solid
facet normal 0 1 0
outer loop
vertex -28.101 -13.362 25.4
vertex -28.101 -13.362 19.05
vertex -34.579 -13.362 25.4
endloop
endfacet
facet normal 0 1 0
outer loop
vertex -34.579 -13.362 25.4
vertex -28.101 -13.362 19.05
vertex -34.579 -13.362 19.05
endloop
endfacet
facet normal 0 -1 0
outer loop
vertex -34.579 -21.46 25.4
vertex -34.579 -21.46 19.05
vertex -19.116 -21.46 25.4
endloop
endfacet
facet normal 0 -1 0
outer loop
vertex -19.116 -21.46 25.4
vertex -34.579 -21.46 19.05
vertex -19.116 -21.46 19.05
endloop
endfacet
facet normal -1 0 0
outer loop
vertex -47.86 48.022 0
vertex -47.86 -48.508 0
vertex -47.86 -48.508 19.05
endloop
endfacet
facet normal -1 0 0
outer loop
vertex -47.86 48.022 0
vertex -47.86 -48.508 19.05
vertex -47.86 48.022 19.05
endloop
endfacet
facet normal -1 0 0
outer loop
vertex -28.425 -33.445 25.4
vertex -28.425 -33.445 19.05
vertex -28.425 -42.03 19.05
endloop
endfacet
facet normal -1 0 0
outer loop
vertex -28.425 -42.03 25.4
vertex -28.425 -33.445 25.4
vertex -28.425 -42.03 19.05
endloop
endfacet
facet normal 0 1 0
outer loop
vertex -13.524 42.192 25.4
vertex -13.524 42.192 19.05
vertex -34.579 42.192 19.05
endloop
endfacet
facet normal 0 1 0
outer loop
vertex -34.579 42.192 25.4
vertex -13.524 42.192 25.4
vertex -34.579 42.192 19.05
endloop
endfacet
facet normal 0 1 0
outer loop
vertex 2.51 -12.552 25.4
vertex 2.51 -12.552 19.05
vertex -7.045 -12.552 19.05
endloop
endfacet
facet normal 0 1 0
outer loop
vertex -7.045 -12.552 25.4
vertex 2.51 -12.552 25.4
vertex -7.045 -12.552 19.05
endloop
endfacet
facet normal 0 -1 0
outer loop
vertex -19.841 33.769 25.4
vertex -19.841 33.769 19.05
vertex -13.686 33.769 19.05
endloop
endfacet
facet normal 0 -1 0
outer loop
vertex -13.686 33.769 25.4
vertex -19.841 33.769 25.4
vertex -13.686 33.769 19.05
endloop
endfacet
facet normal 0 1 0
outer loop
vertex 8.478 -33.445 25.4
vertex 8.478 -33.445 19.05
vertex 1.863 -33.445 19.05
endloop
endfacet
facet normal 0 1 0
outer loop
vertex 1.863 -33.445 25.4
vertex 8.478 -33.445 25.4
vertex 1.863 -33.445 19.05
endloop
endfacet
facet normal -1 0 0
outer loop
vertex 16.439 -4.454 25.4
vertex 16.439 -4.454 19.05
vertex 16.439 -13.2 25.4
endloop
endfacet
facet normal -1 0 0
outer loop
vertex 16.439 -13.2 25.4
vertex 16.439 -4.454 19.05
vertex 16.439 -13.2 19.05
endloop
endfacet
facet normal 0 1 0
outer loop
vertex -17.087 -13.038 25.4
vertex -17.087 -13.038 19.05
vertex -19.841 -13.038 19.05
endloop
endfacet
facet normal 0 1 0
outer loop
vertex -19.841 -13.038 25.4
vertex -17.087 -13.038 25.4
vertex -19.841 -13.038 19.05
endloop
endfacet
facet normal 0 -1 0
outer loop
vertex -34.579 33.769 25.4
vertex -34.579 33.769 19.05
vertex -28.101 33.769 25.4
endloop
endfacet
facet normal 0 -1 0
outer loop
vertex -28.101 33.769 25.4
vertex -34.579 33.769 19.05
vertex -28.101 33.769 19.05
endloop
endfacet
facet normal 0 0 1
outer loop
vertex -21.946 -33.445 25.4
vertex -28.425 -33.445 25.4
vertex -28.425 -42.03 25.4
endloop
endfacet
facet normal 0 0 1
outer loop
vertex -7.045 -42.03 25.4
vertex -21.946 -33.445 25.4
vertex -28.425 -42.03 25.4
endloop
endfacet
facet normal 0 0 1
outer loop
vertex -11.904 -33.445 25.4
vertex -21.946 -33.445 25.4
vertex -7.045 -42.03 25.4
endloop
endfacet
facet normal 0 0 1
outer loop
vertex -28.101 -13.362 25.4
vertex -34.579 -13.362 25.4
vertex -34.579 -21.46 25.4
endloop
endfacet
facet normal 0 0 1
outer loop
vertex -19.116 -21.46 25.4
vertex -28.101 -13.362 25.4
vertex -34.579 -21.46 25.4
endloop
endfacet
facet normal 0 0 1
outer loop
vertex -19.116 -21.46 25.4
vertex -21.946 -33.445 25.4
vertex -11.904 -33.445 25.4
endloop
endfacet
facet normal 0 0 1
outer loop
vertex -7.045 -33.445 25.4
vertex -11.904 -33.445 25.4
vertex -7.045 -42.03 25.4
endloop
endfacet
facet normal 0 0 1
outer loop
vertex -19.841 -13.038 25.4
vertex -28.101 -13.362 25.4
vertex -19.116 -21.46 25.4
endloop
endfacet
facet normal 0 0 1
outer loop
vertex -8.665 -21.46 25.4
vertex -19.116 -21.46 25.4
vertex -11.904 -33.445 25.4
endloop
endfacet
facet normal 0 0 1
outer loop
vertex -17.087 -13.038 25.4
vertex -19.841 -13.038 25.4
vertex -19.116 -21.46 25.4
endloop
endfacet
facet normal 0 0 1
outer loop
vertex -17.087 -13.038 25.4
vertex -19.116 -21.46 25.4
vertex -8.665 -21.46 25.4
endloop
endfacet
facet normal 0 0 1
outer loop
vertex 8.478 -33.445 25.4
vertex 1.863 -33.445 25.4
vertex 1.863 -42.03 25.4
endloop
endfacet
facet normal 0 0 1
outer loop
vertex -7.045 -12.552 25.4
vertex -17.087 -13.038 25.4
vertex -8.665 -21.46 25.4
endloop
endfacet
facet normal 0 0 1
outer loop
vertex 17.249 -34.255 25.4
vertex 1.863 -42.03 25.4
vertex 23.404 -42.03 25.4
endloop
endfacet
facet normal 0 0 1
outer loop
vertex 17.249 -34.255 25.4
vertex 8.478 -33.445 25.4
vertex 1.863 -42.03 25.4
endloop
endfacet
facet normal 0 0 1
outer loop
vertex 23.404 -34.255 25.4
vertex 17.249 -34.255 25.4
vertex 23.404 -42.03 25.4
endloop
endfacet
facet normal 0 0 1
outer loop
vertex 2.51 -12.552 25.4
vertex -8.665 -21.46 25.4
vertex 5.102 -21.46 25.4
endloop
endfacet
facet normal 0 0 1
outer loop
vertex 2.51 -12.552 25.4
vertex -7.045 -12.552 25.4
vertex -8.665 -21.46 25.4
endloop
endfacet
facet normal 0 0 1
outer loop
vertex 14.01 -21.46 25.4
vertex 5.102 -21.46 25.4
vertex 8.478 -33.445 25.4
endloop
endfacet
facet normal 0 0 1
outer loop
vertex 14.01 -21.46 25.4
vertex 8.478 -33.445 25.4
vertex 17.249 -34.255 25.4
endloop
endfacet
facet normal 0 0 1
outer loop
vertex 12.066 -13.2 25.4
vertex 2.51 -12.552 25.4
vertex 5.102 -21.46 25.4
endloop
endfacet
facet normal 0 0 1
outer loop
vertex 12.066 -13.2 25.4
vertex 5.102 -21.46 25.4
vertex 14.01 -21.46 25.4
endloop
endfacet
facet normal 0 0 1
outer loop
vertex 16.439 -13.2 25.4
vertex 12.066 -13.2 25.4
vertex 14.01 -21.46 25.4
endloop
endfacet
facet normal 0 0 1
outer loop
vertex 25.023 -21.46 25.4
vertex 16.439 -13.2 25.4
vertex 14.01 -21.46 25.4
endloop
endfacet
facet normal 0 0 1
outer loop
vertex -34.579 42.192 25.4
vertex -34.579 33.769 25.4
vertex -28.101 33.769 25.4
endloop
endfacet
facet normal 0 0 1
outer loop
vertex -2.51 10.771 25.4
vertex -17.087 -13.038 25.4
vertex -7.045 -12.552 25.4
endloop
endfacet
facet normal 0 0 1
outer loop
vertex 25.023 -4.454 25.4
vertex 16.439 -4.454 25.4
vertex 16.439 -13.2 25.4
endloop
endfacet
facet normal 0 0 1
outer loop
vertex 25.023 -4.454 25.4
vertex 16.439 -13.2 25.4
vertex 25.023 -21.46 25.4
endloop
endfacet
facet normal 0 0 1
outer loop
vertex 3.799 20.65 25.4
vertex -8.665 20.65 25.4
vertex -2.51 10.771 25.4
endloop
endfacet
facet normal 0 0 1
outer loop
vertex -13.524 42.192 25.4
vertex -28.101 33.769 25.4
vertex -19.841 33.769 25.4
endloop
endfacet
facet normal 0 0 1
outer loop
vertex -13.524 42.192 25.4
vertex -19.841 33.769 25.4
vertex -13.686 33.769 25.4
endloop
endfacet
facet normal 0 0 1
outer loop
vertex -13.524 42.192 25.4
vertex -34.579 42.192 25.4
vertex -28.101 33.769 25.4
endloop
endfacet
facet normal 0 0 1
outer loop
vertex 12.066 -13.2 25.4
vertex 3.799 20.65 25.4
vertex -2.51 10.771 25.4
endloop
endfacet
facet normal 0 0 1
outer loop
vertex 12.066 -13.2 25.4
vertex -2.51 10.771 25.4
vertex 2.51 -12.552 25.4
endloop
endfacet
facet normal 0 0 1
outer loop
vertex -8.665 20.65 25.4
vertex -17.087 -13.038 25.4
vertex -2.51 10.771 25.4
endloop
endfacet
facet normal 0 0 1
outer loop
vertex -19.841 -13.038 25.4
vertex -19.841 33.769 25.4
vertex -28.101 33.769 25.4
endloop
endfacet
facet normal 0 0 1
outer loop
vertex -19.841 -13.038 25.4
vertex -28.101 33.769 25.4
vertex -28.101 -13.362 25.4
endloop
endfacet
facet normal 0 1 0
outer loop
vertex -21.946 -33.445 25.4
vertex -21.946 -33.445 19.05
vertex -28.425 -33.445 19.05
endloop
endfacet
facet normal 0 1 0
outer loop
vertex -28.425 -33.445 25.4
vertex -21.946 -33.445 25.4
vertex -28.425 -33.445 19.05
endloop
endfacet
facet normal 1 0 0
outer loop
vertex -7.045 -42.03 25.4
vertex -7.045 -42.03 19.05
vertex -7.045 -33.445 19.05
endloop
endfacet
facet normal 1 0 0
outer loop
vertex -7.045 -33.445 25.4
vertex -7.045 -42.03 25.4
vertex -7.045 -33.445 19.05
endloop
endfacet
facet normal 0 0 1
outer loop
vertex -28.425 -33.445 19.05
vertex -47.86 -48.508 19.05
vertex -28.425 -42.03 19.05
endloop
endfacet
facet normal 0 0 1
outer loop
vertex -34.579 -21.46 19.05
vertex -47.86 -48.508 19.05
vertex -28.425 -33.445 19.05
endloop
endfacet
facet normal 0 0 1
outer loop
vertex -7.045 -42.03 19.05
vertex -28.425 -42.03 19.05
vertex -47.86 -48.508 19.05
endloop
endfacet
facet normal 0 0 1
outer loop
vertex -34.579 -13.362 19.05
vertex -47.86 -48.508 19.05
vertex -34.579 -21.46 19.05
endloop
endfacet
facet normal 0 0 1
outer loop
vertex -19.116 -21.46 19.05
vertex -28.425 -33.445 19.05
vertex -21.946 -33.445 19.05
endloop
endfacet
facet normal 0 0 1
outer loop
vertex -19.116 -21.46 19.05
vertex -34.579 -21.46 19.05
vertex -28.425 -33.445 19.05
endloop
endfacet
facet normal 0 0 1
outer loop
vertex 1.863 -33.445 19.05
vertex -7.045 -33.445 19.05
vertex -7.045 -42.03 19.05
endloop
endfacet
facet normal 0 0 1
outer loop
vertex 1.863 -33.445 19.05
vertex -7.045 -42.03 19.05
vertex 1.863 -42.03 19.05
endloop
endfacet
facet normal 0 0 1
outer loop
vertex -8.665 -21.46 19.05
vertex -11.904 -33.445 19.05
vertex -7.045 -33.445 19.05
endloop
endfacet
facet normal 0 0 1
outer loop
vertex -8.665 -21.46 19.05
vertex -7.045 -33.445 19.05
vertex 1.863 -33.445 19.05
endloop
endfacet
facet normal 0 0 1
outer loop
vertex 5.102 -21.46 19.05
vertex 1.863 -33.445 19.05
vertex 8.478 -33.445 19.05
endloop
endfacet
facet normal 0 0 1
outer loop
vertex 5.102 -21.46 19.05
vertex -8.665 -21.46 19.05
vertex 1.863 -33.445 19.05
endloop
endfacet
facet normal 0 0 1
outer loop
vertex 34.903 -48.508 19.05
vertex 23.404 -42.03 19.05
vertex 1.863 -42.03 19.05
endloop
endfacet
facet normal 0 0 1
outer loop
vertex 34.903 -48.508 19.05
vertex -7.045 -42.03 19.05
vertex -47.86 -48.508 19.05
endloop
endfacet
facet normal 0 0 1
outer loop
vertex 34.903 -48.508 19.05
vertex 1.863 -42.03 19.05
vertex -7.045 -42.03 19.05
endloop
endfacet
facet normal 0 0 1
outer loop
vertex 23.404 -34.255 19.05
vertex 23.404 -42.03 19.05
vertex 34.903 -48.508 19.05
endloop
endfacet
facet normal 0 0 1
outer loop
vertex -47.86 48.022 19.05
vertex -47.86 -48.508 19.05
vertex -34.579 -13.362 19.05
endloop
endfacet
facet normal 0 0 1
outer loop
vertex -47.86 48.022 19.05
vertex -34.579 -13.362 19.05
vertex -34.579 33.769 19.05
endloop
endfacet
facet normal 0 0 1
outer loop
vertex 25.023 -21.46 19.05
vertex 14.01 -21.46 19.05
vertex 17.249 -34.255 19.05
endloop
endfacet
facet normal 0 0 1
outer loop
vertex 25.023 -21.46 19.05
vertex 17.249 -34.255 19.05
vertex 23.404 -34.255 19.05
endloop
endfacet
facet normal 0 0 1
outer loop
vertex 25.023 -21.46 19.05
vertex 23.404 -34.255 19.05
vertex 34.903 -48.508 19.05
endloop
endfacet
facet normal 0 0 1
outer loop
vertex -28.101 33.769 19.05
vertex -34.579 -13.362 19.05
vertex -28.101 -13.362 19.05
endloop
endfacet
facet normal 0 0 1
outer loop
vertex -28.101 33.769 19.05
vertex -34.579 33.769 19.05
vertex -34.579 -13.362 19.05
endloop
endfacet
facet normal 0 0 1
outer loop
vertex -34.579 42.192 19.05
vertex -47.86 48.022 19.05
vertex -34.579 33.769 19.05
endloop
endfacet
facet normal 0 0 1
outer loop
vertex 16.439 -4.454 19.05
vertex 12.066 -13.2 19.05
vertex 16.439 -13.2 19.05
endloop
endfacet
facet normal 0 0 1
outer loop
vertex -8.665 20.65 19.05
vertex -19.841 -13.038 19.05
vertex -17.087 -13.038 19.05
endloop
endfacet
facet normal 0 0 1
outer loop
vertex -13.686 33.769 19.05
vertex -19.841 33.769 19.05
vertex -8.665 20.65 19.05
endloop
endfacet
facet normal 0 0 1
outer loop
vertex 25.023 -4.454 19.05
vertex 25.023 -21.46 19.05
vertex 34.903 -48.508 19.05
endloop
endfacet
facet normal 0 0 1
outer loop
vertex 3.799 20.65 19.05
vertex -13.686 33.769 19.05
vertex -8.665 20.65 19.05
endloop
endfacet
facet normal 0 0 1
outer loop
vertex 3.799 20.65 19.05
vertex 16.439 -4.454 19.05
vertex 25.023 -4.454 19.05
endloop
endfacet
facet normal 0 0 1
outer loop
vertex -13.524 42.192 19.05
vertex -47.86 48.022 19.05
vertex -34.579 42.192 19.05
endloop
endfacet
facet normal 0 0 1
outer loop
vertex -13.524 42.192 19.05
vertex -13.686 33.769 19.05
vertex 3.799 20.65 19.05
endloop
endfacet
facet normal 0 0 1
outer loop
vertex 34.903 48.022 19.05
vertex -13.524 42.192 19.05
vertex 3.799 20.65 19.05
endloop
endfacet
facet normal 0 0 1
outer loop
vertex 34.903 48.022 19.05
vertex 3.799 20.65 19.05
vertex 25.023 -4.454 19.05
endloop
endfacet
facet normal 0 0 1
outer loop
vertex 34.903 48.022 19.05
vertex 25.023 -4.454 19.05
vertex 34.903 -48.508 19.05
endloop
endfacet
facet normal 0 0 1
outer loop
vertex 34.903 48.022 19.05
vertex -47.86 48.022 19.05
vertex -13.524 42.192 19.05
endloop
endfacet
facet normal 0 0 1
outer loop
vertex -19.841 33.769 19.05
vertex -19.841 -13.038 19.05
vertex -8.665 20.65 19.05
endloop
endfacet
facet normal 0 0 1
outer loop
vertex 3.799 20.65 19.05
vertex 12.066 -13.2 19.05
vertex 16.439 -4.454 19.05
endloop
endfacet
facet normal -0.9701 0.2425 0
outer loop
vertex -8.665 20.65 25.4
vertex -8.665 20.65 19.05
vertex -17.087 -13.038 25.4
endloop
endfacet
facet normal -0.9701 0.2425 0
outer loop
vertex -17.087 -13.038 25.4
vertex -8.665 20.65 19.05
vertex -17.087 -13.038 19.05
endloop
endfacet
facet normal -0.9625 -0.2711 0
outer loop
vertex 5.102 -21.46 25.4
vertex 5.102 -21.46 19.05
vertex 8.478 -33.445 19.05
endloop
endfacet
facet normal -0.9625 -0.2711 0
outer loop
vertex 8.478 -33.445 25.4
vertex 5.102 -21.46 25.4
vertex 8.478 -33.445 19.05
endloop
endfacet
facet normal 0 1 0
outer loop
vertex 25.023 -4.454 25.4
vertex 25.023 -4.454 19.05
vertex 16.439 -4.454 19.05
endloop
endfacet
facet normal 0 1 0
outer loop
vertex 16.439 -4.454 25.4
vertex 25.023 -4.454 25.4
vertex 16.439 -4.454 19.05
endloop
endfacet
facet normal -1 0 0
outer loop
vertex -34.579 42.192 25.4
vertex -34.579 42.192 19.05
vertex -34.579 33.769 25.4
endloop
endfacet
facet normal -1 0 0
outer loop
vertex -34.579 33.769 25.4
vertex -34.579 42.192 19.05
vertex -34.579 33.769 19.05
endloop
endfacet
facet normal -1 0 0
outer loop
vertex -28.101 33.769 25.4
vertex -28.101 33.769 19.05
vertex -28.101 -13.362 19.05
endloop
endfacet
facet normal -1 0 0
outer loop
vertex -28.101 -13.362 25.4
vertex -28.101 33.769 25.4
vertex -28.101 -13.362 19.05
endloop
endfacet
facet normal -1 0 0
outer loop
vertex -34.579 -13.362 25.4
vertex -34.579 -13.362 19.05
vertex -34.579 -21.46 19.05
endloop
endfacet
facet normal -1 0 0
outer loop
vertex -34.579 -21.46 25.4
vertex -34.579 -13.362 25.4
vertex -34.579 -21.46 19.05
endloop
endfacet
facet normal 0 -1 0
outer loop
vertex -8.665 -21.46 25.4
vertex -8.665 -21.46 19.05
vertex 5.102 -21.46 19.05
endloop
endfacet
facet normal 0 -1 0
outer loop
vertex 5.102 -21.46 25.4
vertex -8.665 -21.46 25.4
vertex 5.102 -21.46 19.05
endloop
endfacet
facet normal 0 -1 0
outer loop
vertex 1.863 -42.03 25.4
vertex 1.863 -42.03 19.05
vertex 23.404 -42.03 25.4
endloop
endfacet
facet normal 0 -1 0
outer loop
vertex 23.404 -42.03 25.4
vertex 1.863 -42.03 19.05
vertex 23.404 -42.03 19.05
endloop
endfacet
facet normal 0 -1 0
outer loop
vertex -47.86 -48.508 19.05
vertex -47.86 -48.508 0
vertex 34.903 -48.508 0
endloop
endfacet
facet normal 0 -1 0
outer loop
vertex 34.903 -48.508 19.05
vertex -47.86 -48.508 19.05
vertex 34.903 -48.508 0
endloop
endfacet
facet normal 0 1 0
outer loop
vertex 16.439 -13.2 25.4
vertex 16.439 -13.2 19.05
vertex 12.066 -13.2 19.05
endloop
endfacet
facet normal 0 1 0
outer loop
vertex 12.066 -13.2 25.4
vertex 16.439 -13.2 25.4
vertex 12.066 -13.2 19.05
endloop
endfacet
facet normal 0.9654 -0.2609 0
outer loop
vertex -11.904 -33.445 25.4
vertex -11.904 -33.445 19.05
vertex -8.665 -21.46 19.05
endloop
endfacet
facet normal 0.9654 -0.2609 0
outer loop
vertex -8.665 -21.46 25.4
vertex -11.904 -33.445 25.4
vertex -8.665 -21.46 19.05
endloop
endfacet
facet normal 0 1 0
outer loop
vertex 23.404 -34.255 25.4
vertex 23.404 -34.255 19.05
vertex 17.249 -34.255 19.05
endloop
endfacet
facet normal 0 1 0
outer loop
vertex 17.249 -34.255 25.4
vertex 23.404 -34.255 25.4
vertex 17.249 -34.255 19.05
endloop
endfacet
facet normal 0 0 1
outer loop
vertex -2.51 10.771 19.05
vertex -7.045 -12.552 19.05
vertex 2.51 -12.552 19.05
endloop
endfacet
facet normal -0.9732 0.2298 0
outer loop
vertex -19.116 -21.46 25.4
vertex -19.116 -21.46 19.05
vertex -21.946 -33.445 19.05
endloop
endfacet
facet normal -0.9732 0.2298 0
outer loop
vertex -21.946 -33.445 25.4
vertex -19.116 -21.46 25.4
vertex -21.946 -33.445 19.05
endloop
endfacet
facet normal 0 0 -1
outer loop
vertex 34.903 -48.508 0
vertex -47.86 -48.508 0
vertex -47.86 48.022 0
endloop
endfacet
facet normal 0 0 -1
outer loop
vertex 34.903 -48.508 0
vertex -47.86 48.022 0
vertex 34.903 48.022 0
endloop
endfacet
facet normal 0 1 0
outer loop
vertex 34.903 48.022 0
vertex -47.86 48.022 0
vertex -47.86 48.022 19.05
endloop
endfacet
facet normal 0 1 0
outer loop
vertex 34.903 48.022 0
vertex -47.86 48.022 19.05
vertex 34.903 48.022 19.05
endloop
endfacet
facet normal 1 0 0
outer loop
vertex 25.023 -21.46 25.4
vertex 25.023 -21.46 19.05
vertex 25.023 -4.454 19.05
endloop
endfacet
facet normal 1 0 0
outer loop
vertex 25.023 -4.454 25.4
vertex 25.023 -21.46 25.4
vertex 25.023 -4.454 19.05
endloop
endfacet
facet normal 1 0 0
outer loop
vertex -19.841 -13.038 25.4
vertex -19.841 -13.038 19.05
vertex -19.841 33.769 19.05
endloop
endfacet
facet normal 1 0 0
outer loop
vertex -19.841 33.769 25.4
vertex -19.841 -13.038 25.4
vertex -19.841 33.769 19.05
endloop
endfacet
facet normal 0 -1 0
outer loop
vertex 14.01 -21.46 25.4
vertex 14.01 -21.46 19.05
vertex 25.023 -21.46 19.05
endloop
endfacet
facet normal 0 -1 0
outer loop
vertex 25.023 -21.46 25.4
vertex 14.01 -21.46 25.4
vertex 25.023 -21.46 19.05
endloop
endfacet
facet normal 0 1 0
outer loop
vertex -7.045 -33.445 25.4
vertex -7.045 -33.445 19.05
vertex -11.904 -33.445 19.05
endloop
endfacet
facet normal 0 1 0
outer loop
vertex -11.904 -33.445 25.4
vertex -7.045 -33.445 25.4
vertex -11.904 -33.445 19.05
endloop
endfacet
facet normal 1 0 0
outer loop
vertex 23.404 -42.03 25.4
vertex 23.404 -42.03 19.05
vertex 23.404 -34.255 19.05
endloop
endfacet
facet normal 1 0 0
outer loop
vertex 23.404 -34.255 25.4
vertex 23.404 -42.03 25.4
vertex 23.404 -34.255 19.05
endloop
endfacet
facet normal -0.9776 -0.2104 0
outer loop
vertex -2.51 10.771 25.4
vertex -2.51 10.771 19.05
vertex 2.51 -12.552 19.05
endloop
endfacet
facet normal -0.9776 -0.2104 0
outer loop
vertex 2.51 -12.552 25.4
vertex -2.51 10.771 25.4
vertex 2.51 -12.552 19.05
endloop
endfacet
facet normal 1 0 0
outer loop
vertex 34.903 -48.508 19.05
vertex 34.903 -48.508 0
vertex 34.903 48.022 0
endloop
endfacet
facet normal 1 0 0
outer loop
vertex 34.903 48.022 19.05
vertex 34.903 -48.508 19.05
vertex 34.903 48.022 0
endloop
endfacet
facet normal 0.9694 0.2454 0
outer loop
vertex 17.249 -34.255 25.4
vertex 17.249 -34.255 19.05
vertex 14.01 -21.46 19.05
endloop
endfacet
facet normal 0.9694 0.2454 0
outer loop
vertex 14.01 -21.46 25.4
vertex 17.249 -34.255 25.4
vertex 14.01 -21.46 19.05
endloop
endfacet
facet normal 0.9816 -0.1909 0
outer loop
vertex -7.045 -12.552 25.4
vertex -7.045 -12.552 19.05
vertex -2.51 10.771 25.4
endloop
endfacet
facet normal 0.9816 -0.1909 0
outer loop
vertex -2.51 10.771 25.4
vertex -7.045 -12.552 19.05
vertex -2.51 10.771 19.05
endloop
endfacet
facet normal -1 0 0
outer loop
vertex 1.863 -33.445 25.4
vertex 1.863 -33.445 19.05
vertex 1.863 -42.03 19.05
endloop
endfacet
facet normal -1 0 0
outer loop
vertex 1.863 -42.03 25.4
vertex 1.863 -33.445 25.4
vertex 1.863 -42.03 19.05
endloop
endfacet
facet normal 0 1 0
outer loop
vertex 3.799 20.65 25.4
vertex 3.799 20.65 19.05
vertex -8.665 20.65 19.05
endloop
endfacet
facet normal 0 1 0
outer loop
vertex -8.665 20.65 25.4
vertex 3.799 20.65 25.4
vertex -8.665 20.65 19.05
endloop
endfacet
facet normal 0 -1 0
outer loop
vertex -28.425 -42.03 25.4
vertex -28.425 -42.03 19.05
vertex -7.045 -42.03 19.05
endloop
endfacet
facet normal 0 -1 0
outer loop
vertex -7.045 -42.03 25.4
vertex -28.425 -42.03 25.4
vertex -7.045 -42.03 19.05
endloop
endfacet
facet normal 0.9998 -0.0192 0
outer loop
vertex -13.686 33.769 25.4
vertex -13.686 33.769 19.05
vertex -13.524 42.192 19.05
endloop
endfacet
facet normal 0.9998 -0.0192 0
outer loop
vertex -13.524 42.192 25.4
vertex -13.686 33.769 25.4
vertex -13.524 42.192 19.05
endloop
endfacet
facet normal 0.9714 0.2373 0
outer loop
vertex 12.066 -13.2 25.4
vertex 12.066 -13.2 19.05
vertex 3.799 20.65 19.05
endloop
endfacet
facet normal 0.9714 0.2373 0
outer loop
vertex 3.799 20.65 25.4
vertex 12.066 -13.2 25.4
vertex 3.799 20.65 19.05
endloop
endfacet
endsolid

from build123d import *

# Parameters (mm, degrees)
F1_DEPTH = 25.4
F2_W     = 82.763381
F2_H     = 96.530288
F3_DEPTH = 19.05


with BuildPart() as f1:
    # F0 (on Top) → F1 (new body)
    with BuildSketch(Plane.XY):
        Polygon((-13.685921, 33.769403), (-13.523958, 42.191509), (-34.579221, 42.191509), (-34.579221, 33.769403), (-28.100679, 33.769403), (-28.100679, -13.361994), (-34.579221, -13.361994), (-34.579221, -21.460174), (-19.1162, -21.460174), (-21.946063, -33.445477), (-28.424606, -33.445477), (-28.424606, -42.029545), (-7.045416, -42.029545), (-7.045416, -33.445477), (-11.904322, -33.445477), (-8.665049, -21.460174), (5.101852, -21.460174), (8.477995, -33.445477), (1.86258, -33.445477), (1.86258, -42.029545), (23.403736, -42.029545), (23.403736, -34.255296), (17.249119, -34.255296), (14.009847, -21.460174), (25.023371, -21.460174), (25.023371, -4.453998), (16.439302, -4.453998), (16.439302, -13.200031), (12.066286, -13.200031), (3.79868, 20.650355), (-8.665049, 20.650355), (-17.087156, -13.038067), (-19.840537, -13.038067), (-19.840537, 33.769403), align=None)
        Polygon((-7.045416, -12.552176), (-2.510434, 10.770578), (2.510437, -12.552176), align=None, mode=Mode.SUBTRACT)
    extrude(amount=F1_DEPTH)

    # F2 (on Top) → F3 (join)
    with BuildSketch(Plane.XY):
        with Locations((-6.478544, -0.242945)):
            Rectangle(F2_W, F2_H)
    extrude(amount=F3_DEPTH)


solid = f1.part
